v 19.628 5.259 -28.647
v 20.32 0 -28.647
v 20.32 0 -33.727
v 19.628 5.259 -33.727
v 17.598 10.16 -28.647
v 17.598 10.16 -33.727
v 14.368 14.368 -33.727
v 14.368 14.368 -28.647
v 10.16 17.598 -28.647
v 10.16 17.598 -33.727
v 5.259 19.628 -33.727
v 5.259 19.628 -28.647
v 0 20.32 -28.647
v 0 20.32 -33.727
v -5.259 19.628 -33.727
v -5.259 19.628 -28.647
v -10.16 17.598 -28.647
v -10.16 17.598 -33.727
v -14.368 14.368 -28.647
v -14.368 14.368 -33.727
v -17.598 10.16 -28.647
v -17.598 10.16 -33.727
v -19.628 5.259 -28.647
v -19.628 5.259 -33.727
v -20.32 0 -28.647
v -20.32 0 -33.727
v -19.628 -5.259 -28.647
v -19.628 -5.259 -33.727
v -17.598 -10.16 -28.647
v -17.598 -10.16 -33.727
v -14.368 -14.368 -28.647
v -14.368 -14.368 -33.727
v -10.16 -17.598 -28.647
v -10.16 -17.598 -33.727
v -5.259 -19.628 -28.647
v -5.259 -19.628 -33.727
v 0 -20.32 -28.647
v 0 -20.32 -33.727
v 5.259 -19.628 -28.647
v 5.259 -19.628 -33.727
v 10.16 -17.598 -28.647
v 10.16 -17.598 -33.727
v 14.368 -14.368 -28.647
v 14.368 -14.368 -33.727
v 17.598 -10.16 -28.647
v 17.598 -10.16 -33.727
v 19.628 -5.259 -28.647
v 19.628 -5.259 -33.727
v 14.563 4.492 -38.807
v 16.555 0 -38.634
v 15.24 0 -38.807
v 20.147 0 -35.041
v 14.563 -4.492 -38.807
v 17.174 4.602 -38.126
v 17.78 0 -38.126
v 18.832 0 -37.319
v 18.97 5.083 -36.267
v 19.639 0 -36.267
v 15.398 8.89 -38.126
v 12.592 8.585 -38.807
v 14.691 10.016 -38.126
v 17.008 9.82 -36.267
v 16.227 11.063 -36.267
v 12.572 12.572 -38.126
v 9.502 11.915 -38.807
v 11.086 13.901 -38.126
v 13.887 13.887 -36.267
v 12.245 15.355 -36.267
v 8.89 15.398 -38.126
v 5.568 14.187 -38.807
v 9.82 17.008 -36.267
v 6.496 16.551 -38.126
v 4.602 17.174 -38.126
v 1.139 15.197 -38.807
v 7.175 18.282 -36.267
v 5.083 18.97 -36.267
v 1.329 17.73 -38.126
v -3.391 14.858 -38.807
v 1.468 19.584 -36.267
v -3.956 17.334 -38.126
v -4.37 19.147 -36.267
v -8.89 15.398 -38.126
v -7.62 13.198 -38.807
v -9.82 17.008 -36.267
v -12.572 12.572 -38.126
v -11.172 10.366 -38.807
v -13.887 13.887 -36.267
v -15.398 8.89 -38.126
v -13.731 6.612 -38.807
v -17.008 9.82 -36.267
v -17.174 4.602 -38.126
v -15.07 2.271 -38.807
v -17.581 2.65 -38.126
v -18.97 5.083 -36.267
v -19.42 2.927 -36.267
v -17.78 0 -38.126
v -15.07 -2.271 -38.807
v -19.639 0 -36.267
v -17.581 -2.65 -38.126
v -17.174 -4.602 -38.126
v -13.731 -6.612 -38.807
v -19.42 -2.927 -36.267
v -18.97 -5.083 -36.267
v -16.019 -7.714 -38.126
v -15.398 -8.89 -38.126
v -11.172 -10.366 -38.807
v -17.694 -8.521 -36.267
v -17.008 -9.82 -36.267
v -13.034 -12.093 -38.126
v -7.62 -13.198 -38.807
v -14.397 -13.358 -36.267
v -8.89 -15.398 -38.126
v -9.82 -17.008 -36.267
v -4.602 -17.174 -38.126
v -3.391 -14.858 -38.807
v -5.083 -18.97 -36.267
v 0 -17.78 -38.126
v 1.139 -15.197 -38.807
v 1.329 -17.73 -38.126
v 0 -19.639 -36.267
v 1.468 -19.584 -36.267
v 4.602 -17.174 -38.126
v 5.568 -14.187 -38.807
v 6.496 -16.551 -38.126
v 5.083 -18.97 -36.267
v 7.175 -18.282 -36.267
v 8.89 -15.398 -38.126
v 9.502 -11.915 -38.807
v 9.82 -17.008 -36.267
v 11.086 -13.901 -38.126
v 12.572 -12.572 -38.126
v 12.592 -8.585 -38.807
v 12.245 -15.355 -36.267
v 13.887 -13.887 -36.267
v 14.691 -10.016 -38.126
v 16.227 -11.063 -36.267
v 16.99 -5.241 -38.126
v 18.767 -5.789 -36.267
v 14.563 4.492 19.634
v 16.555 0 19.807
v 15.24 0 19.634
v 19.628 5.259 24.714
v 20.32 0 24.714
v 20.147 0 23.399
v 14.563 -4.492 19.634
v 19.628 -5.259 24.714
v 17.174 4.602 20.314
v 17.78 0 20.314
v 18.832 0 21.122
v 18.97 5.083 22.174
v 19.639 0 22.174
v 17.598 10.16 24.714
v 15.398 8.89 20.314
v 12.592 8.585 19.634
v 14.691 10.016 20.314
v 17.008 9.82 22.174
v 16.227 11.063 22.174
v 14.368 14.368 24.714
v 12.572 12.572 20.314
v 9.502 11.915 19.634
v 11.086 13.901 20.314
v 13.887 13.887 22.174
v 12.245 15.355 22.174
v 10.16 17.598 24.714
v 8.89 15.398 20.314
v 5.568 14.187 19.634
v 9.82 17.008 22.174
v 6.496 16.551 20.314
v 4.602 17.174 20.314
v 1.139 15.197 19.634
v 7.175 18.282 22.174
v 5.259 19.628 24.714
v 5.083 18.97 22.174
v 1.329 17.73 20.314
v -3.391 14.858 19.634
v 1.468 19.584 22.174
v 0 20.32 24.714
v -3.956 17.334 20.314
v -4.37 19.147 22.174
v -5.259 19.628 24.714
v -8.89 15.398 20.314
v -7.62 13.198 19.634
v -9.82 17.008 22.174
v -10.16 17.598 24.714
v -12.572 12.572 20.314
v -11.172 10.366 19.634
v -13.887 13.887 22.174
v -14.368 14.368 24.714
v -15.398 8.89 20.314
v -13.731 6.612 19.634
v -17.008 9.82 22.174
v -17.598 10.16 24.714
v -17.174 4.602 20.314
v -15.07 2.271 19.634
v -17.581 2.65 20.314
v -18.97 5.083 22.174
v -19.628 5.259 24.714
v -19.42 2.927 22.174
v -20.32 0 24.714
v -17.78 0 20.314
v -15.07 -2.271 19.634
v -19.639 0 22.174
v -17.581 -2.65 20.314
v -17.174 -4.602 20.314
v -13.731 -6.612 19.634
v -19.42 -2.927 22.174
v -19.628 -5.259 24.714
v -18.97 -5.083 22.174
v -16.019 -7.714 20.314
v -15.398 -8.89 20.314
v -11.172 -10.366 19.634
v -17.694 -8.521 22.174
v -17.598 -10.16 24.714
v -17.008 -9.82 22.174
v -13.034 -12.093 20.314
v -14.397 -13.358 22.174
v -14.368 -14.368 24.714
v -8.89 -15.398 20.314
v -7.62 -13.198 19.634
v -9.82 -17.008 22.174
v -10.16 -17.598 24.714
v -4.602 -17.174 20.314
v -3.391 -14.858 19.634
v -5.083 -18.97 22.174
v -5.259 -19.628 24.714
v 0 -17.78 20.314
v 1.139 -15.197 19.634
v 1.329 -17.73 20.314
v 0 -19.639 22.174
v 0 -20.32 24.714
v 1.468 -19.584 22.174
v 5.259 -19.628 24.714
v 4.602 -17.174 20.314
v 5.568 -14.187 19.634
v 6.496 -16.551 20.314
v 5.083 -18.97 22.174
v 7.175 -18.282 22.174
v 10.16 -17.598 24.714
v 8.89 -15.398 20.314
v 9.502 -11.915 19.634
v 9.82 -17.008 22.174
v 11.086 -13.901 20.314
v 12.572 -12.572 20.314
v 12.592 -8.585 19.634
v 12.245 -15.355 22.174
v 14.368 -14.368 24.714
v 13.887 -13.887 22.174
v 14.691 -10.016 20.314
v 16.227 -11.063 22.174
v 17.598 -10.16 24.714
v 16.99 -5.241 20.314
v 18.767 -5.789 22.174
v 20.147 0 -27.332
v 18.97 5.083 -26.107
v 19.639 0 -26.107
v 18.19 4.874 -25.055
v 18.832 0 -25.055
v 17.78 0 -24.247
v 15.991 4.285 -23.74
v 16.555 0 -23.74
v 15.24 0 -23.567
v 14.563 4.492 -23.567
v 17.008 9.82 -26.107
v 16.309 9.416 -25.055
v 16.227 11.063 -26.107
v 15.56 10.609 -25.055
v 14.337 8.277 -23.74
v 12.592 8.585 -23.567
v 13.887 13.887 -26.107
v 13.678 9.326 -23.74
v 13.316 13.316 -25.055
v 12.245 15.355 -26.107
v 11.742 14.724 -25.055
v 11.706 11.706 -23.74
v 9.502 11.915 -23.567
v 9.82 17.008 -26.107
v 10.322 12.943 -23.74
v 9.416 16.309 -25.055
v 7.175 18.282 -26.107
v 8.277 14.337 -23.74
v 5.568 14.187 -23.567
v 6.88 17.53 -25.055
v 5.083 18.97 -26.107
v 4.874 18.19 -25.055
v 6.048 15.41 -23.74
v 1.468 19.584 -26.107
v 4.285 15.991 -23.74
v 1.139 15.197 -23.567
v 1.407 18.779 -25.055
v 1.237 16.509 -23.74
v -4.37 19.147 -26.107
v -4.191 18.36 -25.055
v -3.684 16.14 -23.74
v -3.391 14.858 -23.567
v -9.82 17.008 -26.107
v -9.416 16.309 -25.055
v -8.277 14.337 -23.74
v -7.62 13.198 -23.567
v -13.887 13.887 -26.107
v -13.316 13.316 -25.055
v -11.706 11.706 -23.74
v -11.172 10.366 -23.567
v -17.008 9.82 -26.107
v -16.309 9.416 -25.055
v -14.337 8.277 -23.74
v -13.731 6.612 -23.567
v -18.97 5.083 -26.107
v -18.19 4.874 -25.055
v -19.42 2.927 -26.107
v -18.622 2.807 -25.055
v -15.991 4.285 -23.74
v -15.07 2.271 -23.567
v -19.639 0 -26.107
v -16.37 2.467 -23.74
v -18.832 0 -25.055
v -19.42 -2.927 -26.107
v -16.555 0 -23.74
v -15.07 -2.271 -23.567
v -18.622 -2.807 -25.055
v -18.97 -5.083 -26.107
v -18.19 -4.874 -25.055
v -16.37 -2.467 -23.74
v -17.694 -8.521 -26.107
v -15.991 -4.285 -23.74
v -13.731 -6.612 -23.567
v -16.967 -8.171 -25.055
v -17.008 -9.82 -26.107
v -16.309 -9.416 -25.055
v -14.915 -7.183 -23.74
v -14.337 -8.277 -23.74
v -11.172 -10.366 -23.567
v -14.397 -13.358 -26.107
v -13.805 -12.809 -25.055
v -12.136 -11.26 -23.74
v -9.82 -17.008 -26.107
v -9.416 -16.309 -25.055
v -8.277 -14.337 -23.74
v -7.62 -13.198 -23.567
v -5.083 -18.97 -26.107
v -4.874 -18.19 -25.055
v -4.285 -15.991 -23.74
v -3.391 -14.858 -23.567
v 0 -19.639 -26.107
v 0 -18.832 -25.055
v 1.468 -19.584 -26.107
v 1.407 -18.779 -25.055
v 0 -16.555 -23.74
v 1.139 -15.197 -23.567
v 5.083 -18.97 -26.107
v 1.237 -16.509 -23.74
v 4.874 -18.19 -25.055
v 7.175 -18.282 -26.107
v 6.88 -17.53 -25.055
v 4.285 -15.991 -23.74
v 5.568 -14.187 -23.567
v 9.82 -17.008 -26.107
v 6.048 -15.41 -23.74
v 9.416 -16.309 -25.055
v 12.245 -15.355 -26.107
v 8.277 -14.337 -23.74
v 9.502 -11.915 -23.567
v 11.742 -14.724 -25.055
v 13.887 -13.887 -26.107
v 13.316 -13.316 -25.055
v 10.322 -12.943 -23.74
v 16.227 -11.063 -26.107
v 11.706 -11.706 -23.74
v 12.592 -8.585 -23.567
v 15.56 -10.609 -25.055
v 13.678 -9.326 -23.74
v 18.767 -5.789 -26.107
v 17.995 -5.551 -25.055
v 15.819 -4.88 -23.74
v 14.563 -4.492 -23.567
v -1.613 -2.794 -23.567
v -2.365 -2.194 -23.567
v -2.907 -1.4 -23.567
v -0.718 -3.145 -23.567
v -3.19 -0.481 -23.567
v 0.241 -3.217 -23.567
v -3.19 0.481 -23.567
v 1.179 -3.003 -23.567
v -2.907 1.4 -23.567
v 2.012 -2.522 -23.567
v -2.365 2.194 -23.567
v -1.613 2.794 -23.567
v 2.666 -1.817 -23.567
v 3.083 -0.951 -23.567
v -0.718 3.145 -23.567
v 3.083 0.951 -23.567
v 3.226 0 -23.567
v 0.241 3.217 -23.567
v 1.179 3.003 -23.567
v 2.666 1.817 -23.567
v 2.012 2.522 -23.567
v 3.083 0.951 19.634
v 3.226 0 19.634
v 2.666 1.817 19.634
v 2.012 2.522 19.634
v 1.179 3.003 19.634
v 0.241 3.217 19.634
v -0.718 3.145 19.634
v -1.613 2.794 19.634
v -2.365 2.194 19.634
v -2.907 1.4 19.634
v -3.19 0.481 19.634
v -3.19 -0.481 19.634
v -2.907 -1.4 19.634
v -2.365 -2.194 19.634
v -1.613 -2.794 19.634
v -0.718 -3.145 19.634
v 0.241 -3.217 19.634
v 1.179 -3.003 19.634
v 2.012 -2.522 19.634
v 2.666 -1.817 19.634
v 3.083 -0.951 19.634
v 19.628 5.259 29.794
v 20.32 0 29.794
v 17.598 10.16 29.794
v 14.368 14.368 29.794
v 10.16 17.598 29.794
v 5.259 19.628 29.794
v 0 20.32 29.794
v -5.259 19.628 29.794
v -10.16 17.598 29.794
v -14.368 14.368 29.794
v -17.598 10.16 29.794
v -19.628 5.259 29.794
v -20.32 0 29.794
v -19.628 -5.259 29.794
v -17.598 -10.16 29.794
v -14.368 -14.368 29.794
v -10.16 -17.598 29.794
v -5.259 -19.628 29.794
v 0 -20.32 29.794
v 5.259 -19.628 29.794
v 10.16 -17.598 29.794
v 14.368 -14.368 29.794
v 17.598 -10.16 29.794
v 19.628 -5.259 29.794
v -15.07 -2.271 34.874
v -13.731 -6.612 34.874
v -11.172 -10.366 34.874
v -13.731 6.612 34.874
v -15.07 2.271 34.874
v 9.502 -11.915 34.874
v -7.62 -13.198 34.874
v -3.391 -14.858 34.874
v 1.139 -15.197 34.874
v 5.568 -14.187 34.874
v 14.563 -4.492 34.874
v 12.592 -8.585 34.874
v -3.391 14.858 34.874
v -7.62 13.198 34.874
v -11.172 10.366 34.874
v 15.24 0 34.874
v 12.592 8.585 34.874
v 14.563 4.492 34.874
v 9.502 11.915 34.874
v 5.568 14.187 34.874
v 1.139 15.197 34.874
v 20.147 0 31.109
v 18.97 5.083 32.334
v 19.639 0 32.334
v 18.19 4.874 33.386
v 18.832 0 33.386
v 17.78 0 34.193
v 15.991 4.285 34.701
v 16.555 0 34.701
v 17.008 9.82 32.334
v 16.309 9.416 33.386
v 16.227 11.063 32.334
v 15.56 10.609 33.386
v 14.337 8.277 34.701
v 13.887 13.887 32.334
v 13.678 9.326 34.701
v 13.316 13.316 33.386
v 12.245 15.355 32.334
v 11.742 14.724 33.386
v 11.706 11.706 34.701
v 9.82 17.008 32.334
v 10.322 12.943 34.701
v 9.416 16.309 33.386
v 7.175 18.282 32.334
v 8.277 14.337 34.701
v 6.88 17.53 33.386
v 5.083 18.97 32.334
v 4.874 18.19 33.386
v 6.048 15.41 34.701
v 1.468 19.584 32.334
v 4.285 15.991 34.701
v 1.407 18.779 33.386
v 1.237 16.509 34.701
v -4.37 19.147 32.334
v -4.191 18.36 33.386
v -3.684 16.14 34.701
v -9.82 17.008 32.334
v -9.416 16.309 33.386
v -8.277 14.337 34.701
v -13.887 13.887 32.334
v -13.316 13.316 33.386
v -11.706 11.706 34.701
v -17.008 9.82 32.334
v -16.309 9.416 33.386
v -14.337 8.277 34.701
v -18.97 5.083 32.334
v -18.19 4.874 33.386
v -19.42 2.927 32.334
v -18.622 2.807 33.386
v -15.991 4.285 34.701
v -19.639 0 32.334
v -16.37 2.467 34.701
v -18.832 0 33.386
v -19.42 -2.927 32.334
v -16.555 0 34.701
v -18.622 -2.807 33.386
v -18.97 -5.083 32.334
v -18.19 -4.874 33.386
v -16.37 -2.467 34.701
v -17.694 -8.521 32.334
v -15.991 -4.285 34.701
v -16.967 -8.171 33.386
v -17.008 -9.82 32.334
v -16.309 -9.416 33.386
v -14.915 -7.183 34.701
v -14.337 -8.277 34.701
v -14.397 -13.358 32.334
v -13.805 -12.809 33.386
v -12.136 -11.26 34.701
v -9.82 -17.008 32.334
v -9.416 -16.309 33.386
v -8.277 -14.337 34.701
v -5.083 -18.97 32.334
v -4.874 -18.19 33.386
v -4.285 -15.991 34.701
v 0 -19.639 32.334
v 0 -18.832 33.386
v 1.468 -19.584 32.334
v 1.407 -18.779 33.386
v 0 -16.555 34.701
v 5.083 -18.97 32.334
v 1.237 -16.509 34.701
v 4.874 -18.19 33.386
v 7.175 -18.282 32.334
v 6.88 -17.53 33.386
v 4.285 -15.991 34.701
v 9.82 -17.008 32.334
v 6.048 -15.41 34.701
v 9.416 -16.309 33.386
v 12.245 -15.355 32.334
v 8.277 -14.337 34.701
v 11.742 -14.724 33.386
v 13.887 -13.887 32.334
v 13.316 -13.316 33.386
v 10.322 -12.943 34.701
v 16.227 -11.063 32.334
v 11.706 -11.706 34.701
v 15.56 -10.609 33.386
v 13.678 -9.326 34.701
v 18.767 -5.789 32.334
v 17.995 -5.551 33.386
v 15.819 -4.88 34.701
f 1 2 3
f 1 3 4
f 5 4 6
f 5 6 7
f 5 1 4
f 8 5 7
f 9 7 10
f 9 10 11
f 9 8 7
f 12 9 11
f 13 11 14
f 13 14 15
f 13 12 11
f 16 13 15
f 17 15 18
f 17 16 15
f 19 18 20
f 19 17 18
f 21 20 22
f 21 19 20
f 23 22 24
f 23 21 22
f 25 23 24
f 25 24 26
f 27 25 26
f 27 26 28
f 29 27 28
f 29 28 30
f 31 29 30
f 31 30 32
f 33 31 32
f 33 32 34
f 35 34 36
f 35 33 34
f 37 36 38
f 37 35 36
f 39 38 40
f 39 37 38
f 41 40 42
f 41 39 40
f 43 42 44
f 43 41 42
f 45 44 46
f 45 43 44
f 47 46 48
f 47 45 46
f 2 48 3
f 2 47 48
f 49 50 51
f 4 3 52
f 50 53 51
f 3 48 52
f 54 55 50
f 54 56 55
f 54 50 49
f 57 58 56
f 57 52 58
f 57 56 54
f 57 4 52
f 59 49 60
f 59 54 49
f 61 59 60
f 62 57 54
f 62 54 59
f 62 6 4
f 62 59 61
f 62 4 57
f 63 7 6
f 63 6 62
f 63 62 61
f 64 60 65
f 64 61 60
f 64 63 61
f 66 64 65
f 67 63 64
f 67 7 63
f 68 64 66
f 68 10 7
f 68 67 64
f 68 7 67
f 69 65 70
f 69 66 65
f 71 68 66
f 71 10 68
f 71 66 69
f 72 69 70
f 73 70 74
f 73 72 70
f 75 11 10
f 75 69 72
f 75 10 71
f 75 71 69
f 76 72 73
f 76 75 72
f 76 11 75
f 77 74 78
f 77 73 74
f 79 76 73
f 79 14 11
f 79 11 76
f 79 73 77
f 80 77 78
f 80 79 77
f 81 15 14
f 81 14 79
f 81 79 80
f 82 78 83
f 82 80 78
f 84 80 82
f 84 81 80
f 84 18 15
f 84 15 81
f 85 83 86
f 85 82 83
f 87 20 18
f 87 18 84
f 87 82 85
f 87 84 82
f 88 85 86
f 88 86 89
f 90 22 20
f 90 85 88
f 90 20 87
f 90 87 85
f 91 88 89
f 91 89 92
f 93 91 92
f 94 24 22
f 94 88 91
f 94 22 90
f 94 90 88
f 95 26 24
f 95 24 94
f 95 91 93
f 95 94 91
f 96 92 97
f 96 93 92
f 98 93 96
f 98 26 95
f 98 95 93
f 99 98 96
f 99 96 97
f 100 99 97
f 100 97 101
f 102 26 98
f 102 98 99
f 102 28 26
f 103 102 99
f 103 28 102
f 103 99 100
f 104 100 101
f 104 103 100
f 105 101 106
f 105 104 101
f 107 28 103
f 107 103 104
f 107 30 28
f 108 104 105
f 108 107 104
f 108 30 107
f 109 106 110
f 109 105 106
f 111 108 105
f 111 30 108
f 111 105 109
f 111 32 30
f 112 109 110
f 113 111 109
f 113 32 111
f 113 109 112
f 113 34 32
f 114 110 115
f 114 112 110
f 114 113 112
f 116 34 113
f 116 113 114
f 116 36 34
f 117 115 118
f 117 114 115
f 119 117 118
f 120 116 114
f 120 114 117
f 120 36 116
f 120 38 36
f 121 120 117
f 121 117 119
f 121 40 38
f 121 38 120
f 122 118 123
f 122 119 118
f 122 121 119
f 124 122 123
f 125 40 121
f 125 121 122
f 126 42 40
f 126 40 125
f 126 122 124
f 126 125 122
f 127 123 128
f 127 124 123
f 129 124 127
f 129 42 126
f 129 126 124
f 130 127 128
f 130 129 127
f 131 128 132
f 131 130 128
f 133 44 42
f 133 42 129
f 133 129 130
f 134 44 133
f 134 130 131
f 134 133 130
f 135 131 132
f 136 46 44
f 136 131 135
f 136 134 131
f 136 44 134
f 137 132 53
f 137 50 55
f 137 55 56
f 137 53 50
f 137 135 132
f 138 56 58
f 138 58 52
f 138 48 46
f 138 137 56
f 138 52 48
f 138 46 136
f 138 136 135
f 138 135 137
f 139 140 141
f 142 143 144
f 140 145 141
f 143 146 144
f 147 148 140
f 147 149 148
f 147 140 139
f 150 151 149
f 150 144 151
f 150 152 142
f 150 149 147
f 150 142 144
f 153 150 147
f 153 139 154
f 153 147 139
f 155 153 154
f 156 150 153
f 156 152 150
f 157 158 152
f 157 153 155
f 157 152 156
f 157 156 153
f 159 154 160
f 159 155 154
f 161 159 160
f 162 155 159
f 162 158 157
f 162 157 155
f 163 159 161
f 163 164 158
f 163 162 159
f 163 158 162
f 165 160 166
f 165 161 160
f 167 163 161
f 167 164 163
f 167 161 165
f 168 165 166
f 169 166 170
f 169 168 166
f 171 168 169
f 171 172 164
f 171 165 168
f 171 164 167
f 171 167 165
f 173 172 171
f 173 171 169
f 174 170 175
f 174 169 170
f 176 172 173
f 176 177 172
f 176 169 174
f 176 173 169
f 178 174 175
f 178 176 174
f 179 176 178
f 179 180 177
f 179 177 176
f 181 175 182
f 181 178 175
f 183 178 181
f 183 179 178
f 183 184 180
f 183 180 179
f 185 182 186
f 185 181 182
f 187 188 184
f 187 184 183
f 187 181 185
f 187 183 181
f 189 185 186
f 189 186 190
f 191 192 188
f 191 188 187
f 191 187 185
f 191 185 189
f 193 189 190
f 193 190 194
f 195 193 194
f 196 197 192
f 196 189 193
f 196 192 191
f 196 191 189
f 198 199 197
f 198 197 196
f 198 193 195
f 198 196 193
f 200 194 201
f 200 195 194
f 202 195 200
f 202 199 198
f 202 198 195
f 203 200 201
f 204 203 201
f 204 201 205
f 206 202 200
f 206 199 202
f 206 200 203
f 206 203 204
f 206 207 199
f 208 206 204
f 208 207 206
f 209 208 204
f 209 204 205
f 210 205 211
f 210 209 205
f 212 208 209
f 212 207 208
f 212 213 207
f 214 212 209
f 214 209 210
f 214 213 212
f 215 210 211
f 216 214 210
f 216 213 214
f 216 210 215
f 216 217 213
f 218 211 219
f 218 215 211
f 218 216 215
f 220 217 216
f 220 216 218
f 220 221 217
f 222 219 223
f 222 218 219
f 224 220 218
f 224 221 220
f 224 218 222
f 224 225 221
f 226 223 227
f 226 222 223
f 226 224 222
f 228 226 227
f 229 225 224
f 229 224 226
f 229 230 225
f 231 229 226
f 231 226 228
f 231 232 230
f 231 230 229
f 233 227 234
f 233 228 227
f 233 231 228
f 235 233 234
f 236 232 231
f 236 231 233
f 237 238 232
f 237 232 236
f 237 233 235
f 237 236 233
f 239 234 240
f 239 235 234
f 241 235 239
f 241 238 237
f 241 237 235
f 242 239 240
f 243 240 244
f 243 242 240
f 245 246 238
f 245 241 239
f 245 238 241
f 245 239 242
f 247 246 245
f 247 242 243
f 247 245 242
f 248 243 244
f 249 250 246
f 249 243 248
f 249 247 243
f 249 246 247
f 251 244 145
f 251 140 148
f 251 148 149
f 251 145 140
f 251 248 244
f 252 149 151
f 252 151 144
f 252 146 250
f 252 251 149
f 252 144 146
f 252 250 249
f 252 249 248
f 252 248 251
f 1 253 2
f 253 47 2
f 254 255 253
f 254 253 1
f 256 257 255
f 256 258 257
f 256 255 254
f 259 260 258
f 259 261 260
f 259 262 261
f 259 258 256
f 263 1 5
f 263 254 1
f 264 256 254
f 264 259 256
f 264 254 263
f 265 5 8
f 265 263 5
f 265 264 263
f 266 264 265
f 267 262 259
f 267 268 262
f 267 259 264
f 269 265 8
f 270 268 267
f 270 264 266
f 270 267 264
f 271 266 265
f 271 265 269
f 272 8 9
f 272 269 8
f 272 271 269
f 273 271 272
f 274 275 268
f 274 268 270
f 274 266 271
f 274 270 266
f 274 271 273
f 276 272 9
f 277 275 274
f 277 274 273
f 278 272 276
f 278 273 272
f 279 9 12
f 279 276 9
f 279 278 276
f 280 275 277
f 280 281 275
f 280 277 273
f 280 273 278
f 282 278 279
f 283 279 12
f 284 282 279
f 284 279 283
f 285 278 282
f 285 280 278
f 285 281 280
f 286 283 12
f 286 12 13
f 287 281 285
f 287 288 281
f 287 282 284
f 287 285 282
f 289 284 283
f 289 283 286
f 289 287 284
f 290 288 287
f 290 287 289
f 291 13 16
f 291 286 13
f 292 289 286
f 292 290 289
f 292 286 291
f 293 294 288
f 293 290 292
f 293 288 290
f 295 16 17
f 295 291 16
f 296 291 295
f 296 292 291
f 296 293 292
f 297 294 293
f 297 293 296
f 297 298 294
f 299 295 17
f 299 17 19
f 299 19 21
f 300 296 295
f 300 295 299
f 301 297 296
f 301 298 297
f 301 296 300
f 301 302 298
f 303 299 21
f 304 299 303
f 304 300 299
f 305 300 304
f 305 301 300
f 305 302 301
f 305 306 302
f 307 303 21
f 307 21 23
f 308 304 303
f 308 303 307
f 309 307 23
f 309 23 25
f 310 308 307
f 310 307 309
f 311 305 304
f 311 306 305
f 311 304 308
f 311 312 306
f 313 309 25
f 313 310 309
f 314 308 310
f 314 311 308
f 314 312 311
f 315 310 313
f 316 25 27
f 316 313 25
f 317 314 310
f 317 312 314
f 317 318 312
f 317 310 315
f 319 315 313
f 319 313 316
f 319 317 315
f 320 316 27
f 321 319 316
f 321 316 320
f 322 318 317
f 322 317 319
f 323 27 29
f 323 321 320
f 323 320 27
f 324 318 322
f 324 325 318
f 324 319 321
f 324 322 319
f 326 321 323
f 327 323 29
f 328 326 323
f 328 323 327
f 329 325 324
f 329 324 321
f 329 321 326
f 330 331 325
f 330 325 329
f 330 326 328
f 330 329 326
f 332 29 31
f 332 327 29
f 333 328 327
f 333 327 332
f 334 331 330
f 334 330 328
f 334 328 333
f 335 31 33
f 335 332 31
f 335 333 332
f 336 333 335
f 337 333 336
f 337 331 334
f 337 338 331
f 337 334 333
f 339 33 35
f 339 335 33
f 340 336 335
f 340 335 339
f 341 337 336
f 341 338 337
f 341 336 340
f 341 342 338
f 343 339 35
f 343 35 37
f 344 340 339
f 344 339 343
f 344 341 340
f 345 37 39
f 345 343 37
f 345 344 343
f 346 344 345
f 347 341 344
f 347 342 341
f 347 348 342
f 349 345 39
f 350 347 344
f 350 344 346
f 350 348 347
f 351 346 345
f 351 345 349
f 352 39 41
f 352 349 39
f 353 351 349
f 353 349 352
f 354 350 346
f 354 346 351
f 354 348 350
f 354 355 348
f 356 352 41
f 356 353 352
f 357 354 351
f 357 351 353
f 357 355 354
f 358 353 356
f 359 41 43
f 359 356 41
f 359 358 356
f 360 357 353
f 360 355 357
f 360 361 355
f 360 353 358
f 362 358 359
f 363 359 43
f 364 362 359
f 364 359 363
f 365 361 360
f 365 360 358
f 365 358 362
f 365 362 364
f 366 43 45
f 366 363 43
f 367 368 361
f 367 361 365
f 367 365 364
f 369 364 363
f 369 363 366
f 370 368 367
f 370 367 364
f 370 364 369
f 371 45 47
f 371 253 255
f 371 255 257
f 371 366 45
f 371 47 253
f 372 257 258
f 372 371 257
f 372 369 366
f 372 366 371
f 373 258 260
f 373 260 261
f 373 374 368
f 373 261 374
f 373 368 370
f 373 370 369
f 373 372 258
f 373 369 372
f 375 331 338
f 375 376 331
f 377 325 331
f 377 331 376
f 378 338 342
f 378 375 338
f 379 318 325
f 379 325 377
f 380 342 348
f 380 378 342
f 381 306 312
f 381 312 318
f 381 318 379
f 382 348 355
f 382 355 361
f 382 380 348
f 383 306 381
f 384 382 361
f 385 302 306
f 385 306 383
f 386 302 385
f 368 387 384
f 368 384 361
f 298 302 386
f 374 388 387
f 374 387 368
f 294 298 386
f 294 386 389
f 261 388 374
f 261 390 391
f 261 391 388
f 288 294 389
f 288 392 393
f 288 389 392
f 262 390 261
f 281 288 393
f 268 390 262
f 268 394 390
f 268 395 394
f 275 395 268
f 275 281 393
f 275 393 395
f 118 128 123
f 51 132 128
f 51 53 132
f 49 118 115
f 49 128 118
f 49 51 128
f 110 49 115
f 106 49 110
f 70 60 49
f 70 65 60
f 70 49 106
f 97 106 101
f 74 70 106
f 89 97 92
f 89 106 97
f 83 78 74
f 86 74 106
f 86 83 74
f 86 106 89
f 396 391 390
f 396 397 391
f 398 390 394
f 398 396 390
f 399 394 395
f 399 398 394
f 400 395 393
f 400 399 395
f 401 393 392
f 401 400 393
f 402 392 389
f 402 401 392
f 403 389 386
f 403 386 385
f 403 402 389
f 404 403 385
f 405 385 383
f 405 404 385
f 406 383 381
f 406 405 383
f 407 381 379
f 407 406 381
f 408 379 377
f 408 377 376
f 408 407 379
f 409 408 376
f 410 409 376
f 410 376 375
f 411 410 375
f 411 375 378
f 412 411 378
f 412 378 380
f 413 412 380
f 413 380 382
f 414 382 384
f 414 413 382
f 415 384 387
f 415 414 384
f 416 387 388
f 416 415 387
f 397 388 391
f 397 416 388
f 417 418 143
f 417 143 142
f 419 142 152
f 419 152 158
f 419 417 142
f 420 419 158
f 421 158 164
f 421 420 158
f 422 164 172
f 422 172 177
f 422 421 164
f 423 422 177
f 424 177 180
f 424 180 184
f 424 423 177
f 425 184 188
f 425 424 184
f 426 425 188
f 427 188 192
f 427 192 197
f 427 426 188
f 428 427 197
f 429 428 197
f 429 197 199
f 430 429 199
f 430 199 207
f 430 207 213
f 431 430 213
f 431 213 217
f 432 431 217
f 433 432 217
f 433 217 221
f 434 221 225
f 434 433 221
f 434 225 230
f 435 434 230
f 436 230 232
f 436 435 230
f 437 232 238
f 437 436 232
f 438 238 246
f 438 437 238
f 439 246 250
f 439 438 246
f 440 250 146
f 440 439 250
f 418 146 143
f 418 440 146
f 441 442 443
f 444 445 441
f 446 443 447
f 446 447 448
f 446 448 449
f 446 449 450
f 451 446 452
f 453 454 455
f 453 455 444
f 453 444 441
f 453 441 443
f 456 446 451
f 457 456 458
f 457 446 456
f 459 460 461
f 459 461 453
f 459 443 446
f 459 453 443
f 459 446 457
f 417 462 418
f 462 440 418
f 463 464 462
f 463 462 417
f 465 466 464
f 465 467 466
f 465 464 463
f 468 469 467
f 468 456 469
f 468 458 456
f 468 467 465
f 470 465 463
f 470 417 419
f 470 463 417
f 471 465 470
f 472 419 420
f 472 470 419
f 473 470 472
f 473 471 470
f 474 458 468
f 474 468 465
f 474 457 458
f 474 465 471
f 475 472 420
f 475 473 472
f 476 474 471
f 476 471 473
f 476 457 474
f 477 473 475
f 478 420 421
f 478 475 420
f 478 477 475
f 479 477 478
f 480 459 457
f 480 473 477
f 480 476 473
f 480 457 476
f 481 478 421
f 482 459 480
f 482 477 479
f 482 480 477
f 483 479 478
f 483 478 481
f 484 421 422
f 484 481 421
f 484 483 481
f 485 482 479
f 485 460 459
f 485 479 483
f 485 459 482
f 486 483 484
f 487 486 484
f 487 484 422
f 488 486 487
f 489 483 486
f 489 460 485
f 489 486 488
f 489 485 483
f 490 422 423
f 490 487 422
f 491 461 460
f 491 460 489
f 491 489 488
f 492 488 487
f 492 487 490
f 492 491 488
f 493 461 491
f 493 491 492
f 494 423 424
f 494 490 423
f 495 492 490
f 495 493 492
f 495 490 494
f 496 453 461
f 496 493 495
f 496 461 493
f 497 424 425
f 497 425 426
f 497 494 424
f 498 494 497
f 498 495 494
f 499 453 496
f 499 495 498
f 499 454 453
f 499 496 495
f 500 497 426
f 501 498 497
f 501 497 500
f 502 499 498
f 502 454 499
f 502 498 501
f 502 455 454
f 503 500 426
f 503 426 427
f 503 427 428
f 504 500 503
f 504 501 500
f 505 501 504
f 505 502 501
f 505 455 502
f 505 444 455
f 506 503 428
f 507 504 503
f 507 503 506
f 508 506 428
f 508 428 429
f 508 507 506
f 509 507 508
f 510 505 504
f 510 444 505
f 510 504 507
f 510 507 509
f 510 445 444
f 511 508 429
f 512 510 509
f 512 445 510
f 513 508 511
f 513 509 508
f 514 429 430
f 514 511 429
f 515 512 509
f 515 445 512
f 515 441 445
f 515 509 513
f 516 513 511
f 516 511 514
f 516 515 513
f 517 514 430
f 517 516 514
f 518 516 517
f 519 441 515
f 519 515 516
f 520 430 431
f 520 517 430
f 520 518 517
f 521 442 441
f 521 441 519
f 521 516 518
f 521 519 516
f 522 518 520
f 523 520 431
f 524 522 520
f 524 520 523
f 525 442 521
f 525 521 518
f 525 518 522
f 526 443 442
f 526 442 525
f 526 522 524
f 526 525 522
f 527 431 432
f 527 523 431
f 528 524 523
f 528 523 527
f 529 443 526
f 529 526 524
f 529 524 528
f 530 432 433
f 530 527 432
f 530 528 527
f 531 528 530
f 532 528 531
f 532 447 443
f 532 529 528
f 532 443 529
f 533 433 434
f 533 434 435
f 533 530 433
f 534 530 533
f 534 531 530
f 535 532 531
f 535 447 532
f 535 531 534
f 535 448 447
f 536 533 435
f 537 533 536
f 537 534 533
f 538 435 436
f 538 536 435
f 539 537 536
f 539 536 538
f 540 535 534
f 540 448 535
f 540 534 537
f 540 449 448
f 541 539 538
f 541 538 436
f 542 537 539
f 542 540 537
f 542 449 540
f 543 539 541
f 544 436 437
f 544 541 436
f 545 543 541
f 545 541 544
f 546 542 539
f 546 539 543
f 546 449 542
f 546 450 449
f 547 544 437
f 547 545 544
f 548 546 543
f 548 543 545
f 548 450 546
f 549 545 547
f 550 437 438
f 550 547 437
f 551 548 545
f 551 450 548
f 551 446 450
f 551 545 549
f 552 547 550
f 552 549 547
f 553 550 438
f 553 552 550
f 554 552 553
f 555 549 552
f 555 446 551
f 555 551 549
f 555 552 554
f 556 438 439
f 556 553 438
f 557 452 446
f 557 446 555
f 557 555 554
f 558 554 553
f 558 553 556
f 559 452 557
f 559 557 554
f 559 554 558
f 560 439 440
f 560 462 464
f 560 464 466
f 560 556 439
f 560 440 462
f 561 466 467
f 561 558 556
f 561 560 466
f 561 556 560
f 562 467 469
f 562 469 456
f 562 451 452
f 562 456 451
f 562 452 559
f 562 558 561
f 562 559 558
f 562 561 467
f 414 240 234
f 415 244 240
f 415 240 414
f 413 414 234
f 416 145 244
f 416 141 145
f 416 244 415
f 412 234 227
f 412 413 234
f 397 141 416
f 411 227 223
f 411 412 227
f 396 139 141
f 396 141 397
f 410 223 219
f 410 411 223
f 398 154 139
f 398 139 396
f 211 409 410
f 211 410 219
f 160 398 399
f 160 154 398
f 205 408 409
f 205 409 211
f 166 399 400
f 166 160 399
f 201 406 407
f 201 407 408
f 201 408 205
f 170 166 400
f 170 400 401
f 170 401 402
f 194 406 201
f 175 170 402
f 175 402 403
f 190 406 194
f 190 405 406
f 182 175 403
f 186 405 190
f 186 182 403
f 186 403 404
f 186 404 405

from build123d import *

# Parameters (mm, degrees)
F0_W = 3.2262087334
F0_H = 43.2004859692
F2_R = 5.08


with BuildPart() as f1:
    # F0 (on Front) → F1 (revolve)
    with BuildSketch(Plane.XZ):
        Polygon((0, -23.5666954911), (0, -38.8066954911), (20.32, -38.8066954911), (20.32, -23.5666954911), (3.2262087334, -23.5666954911), align=None)
        with Locations((1.6131043667, -1.9664525065)):
            Rectangle(F0_W, F0_H)
        Polygon((0, 34.8737904781), (0, 19.6337904781), (3.2262087334, 19.6337904781), (20.32, 19.6337904781), (20.32, 34.8737904781), align=None)
    revolve(axis=Axis((0, 0, -1.9664525065), (0, 0, 1)))

    # F2
    f2_edges = [f1.edges().sort_by_distance(p)[0] for p in [
        (-20.32, 0, 34.87379),
        (-20.32, 0, 19.63379),
        (-20.32, 0, -23.566695),
        (-20.32, 0, -38.806695),
    ]]
    fillet(f2_edges, radius=F2_R)


solid = f1.part
